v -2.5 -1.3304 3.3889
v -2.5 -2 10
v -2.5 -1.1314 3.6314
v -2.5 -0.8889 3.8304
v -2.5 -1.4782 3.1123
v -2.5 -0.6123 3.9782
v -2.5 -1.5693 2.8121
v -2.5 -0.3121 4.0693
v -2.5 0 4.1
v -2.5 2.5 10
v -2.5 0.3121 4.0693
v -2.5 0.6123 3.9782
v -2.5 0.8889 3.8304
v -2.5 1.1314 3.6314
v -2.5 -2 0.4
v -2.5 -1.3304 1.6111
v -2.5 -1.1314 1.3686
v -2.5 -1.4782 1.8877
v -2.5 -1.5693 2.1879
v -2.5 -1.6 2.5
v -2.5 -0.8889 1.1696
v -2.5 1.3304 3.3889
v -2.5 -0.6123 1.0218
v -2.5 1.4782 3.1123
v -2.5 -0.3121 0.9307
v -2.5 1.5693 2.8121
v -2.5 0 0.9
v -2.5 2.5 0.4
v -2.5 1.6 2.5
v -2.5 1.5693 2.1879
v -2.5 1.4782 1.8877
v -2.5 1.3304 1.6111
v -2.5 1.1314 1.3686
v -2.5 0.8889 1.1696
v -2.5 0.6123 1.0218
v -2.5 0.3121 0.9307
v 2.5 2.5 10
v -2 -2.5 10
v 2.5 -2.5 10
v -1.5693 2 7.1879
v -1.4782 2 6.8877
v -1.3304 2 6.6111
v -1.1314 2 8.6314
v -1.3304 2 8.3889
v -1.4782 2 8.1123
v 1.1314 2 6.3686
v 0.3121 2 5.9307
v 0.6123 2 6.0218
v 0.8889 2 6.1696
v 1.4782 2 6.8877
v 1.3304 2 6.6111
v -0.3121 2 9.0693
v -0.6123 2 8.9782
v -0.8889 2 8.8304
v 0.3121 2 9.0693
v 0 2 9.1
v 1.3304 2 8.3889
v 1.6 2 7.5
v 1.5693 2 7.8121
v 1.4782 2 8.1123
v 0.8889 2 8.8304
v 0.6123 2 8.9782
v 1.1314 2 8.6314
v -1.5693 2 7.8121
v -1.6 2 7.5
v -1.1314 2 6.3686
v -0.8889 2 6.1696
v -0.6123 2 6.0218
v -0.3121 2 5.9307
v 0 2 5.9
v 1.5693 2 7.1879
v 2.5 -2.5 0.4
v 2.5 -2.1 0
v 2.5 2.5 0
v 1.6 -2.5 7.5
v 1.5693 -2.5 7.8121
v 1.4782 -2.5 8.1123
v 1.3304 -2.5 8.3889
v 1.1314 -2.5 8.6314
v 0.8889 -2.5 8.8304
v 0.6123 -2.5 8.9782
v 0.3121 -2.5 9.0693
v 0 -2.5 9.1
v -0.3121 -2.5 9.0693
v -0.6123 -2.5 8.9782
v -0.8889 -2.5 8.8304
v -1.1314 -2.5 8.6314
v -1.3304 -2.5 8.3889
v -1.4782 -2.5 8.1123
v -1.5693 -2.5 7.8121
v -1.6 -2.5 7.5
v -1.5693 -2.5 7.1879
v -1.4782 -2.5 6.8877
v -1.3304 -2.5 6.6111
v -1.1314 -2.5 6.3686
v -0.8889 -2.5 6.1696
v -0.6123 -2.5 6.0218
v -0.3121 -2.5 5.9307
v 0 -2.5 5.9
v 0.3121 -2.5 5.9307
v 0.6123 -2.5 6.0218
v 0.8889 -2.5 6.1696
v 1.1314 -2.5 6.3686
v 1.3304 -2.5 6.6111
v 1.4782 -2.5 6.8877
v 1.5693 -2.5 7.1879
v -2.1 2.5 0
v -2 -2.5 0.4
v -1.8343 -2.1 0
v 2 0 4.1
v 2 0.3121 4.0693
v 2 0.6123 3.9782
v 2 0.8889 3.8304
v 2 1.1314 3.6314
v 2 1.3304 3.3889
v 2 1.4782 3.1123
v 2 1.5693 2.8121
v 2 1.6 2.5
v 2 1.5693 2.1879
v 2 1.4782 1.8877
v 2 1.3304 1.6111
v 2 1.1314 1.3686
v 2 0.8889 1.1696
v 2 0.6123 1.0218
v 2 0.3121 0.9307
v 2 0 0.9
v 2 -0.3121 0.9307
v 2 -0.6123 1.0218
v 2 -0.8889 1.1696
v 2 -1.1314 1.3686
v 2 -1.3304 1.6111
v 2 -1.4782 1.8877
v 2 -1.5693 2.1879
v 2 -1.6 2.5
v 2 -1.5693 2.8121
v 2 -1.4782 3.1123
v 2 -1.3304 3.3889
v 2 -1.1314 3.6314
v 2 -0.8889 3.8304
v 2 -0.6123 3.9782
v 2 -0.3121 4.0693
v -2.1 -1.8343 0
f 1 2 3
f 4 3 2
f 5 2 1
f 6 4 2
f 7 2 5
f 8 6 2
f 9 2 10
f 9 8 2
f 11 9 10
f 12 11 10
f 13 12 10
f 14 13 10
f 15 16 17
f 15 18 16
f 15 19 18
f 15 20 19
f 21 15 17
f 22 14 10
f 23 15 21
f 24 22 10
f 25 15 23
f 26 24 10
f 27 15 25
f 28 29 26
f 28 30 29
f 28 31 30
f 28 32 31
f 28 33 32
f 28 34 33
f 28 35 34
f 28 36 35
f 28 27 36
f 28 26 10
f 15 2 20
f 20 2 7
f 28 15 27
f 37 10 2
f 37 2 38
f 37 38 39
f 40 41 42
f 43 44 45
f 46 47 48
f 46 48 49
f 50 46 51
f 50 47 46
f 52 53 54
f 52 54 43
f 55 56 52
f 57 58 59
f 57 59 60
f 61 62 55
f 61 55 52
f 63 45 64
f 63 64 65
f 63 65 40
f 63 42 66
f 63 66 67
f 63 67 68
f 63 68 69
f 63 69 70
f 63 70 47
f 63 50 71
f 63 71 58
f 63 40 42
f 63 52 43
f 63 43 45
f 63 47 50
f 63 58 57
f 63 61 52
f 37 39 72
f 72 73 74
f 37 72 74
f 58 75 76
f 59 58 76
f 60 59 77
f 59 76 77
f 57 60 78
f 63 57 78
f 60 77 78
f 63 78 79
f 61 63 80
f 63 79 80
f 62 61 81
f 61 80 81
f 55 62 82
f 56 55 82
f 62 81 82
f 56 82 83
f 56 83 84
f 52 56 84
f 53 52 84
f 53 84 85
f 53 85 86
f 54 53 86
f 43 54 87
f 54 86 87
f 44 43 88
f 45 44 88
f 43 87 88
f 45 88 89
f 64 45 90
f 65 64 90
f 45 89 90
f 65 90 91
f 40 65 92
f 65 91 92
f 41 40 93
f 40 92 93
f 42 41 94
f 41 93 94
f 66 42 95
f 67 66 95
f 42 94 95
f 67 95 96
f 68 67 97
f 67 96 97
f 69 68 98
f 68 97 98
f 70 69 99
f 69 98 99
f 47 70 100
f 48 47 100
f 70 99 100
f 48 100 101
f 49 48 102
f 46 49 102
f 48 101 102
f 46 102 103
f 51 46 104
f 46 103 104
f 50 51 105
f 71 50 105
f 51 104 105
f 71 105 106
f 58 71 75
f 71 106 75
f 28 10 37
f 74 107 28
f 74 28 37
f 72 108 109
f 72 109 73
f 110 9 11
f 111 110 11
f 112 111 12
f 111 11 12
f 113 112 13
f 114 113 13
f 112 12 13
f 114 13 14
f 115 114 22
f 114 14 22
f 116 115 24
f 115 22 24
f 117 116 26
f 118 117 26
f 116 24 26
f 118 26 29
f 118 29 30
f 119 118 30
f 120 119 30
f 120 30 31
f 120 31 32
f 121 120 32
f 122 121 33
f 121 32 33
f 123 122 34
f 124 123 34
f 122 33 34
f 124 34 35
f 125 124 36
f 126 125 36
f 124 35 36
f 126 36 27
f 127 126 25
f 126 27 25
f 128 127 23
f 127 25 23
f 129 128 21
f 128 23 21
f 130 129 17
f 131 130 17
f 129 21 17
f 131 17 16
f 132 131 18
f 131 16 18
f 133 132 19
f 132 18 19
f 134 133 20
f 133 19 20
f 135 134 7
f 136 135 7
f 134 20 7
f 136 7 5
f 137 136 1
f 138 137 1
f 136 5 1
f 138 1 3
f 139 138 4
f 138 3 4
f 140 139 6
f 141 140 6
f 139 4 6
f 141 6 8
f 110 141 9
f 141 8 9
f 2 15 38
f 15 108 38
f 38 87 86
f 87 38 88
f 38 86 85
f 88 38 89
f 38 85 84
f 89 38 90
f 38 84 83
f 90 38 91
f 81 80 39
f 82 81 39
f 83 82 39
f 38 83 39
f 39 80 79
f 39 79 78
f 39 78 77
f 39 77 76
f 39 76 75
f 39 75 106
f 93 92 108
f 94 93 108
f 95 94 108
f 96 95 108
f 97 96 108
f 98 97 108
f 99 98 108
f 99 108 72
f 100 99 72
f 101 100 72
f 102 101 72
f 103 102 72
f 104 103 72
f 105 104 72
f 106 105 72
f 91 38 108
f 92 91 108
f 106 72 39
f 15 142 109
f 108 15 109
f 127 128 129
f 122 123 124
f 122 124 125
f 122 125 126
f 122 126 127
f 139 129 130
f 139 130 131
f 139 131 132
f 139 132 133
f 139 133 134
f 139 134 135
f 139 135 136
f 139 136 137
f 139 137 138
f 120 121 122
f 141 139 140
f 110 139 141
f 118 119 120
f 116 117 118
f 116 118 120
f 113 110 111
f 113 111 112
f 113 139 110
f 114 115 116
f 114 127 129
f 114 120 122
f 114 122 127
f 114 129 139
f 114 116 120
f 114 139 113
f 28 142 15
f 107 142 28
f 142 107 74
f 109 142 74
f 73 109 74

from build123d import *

# Parameters (mm, degrees)
SKETCH1_W           = 5
SKETCH1_H           = 5
BOSS_EXTRUDE1_DEPTH = 10
SKETCH4_R           = 1.6
CUT_EXTRUDE3_DEPTH  = 4.5
SKETCH5_R           = 1.6
CUT_EXTRUDE4_DEPTH  = 4.5
CHAMFER1_SIZE       = 0.5
CHAMFER4_SIZE       = 0.4


with BuildPart() as part:
    # Sketch1 → Boss-Extrude1 (new body)
    with BuildSketch(Plane.XY):
        Rectangle(SKETCH1_W, SKETCH1_H)
    extrude(amount=BOSS_EXTRUDE1_DEPTH)

    # Sketch4 → Cut-Extrude3 (cut)
    with BuildSketch(Plane.XZ.offset(2.5)):
        with Locations((0, 7.5)):
            Circle(SKETCH4_R)
    extrude(amount=-CUT_EXTRUDE3_DEPTH, mode=Mode.SUBTRACT)

    # Sketch5 → Cut-Extrude4 (cut)
    with BuildSketch(Plane.ZY.offset(2.5)):
        with Locations((2.5, 0)):
            Circle(SKETCH5_R)
    extrude(amount=-CUT_EXTRUDE4_DEPTH, mode=Mode.SUBTRACT)

    # Chamfer1
    chamfer1_edges = [part.edges().sort_by_distance(p)[0] for p in [
        (-2.5, -2.5, 5),
    ]]
    chamfer(chamfer1_edges, length=CHAMFER1_SIZE)

    # Chamfer4
    chamfer4_edges = [part.edges().sort_by_distance(p)[0] for p in [
        (0.25, -2.5, 0),
        (-2.25, -2.25, 0),
        (-2.5, 0.25, 0),
    ]]
    chamfer(chamfer4_edges, length=CHAMFER4_SIZE)


solid = part.part
